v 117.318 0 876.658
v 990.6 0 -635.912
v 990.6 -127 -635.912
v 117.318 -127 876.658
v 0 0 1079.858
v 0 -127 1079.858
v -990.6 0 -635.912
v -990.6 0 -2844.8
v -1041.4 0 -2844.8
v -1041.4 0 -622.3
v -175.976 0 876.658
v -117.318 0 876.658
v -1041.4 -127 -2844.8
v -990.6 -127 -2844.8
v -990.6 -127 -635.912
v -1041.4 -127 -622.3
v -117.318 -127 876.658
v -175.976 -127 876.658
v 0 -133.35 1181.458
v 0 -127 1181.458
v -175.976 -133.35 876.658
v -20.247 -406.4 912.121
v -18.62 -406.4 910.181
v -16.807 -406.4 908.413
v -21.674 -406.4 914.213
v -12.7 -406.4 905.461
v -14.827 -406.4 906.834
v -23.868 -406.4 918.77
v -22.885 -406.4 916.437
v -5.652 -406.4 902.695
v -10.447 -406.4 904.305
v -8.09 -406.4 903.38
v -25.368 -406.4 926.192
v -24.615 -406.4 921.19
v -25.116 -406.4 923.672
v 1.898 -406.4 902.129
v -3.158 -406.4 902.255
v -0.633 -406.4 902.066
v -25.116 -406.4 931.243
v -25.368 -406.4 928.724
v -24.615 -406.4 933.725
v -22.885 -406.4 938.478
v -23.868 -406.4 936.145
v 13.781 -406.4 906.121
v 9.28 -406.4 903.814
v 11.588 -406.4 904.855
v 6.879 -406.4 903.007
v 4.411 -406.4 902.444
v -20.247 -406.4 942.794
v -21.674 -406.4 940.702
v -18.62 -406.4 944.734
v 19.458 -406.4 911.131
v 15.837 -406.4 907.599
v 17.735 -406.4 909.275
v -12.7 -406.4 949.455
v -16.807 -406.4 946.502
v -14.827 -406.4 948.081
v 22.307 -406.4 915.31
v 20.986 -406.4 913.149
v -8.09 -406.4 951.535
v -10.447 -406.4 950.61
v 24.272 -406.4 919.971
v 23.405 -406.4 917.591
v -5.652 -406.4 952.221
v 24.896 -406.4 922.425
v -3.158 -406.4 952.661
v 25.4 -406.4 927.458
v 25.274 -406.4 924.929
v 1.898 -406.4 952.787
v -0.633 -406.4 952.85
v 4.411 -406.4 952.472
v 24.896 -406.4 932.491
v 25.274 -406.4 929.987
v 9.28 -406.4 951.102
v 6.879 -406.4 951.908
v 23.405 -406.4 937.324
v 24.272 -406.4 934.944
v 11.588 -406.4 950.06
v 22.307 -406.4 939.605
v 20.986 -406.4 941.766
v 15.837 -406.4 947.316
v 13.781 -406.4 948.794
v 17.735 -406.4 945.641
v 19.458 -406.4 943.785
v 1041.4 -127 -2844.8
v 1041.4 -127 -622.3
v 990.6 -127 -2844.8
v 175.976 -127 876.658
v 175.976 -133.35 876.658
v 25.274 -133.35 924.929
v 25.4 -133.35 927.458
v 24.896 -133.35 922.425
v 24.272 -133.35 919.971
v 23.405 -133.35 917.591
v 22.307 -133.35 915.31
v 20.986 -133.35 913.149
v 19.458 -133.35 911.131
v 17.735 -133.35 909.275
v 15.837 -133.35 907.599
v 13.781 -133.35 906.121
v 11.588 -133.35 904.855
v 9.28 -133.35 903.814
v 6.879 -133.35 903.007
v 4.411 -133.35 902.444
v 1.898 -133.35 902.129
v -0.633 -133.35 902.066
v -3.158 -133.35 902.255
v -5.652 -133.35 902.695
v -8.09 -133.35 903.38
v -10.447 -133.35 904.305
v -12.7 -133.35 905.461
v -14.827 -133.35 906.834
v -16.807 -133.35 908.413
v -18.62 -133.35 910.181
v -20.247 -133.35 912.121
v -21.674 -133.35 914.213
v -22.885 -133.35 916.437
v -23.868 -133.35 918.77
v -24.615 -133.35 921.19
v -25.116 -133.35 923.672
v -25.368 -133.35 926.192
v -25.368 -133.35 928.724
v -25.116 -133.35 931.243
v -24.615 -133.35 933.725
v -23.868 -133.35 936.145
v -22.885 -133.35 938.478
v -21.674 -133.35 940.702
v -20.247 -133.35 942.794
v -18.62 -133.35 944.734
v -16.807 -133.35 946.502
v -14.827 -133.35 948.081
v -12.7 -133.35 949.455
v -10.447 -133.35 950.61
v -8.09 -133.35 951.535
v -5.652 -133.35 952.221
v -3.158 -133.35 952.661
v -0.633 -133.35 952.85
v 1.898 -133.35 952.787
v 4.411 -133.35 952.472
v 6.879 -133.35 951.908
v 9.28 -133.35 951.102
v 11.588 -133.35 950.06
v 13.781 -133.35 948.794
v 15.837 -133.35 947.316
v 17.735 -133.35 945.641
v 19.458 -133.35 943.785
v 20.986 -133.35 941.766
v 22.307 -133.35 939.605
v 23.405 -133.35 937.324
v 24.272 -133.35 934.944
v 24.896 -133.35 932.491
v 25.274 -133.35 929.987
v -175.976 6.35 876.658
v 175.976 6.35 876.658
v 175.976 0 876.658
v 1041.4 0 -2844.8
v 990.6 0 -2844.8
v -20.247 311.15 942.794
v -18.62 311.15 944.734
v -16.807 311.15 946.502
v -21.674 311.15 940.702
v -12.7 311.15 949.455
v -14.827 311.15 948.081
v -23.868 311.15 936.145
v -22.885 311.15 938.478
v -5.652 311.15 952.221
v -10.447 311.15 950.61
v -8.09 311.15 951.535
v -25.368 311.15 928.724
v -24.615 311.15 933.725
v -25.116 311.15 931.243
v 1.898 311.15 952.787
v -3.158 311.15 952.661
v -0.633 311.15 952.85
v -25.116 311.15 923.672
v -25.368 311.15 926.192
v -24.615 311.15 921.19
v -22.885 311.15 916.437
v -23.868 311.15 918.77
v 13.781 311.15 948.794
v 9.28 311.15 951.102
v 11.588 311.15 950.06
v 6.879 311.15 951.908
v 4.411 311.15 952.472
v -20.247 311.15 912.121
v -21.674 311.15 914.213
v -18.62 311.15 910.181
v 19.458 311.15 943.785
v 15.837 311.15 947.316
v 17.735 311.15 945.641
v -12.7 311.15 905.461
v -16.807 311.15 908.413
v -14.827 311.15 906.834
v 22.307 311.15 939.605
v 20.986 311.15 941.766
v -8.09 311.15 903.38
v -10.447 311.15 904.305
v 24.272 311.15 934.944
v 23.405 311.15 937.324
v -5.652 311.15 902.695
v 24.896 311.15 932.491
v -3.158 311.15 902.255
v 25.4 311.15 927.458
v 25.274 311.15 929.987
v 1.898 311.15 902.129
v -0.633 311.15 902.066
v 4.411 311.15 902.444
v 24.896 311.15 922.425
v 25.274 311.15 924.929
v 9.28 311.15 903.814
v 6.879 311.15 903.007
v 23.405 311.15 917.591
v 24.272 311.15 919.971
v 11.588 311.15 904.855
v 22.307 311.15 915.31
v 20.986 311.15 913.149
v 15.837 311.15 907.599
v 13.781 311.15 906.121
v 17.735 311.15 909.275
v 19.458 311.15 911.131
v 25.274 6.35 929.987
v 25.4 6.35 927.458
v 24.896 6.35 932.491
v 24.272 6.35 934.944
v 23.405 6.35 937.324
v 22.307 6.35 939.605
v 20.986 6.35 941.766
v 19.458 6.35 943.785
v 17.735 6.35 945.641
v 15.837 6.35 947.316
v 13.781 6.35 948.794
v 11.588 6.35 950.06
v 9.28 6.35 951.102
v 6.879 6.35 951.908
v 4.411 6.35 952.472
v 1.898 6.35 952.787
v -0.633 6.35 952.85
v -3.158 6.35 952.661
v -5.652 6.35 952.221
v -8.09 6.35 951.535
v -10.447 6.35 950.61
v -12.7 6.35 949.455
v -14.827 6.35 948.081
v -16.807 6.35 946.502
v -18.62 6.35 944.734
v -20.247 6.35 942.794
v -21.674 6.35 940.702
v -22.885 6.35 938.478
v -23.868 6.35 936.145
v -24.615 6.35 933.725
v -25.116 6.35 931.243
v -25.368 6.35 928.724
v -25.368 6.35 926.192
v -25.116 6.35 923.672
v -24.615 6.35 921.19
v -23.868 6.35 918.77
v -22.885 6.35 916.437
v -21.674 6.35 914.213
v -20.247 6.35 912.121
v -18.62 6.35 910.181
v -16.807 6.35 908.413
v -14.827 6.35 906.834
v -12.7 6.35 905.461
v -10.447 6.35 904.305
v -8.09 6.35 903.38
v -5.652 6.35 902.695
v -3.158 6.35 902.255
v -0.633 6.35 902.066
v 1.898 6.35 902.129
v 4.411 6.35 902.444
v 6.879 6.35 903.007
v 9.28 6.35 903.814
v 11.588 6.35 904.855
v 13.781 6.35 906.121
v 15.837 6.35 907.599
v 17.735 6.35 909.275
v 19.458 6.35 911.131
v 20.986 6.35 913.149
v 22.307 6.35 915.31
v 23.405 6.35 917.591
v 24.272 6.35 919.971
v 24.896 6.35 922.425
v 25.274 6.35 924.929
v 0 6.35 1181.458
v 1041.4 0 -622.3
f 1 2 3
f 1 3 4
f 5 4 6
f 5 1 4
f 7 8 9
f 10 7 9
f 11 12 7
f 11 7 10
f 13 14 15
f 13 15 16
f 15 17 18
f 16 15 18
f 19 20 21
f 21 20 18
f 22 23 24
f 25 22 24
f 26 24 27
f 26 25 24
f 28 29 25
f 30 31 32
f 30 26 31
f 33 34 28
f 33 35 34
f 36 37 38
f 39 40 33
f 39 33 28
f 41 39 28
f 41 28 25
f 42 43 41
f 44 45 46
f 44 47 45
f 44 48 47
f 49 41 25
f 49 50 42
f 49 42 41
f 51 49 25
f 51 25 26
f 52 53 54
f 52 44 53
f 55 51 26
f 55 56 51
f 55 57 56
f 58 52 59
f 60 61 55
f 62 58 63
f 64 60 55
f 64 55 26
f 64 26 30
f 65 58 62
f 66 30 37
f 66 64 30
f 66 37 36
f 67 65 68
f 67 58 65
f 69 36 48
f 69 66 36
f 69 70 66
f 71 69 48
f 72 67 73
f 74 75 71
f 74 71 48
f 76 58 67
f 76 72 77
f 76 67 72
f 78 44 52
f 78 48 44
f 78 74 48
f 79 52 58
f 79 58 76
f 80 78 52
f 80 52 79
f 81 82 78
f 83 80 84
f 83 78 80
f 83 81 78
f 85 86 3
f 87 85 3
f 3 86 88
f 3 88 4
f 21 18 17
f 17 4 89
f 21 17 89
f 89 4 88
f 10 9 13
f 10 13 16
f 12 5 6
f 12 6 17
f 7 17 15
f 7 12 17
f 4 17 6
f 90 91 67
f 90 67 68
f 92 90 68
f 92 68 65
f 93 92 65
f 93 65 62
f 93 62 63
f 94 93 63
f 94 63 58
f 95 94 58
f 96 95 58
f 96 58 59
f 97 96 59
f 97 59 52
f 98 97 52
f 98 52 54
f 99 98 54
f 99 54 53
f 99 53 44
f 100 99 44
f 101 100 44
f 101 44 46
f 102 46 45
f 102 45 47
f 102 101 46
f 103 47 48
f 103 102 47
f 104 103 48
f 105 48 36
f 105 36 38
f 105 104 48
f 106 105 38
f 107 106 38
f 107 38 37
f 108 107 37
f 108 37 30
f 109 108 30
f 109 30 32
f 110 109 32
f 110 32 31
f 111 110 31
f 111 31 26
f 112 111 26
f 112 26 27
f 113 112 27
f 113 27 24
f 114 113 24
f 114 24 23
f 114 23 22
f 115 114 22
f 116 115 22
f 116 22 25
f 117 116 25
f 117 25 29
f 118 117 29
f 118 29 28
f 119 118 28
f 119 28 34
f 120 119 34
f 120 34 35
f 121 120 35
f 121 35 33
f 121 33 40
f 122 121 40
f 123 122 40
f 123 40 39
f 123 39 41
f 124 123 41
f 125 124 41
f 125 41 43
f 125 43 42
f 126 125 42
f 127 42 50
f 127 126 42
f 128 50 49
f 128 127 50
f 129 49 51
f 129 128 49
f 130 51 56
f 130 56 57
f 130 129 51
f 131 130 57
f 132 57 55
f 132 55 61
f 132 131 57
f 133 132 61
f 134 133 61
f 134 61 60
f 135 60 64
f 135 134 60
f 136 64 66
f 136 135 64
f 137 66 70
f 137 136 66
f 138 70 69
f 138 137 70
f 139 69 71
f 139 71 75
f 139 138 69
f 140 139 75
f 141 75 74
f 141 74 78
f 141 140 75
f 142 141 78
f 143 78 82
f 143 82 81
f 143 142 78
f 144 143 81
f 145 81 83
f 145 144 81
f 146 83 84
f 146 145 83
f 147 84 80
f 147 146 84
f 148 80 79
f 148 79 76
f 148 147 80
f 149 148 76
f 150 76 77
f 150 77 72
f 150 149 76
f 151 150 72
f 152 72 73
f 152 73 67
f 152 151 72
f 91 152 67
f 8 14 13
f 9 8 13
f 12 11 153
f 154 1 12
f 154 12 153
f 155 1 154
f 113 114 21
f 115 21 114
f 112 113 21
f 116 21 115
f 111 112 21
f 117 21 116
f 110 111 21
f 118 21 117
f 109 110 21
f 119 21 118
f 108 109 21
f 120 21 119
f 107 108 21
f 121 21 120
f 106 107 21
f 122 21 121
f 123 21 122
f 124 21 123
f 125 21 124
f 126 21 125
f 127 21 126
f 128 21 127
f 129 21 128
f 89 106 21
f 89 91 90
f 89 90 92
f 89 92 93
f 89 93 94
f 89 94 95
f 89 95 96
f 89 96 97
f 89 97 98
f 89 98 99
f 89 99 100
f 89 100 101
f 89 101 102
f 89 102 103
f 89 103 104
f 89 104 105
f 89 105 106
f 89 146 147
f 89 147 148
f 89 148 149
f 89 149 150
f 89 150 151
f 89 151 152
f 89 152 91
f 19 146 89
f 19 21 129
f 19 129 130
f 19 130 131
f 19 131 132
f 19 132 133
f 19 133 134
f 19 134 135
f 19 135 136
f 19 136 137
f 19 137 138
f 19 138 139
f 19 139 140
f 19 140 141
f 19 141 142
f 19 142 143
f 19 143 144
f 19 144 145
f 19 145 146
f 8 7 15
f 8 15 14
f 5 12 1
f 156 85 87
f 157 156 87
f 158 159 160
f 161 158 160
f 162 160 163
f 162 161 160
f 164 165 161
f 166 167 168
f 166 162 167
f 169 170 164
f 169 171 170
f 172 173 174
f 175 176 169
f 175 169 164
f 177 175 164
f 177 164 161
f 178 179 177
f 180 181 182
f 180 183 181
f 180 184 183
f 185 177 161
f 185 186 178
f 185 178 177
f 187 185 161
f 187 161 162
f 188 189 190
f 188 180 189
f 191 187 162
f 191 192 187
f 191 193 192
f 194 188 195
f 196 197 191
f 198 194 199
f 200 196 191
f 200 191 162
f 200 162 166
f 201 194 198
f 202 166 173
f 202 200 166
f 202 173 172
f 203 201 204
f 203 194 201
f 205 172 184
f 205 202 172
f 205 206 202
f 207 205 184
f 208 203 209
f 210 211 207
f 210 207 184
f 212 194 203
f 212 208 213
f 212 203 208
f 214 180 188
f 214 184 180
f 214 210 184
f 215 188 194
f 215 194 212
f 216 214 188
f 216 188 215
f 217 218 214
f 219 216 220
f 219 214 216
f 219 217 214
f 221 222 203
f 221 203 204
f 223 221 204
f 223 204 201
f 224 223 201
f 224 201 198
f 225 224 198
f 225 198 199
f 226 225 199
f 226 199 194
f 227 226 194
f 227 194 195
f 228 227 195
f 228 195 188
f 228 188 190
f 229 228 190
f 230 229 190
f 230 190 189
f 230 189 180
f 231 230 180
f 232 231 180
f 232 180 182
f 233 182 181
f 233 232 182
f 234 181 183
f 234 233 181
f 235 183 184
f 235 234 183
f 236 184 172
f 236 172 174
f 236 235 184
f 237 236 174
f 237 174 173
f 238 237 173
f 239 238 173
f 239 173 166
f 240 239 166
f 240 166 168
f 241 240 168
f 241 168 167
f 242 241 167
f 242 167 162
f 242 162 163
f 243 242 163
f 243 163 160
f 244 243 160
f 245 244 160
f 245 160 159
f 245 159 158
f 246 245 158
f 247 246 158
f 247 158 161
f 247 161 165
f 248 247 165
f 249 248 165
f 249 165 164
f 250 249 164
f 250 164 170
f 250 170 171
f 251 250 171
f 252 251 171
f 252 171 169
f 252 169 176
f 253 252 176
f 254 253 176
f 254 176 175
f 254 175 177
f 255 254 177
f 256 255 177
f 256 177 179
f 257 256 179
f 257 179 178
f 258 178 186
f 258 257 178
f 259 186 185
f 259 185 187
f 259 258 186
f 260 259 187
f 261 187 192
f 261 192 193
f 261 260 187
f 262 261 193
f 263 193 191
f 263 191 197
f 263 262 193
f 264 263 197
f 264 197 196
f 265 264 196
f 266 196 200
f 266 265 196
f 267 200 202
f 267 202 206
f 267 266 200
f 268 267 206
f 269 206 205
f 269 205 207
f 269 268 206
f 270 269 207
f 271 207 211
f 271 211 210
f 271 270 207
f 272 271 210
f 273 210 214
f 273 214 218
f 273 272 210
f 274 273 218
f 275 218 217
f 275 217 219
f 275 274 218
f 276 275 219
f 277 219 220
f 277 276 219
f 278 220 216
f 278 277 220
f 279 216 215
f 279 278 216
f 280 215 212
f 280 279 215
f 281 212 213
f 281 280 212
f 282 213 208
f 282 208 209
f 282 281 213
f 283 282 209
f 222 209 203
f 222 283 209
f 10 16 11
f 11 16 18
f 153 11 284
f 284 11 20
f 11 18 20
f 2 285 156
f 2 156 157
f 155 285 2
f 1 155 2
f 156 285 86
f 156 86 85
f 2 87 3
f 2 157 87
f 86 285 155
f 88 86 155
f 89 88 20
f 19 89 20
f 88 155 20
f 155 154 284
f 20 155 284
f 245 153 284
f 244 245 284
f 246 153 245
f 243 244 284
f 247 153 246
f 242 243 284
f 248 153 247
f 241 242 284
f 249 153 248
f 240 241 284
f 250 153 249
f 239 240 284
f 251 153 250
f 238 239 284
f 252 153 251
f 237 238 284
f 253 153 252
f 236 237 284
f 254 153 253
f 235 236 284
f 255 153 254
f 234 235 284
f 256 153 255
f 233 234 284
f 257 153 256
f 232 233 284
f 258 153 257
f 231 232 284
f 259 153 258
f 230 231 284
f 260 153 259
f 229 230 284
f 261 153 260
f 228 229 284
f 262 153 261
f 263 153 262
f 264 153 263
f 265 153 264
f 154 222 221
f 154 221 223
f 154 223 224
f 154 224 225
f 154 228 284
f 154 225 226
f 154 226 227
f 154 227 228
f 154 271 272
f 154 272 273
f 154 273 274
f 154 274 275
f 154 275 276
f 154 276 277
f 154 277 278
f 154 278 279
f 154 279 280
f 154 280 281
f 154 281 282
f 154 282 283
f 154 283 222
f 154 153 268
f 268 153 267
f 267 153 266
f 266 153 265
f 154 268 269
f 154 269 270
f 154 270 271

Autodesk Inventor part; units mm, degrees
ref_plane "YZ Plane" through (0, 0, 0) normal (1, 0, 0) x (0, 1, 0)
ref_plane "XZ Plane" through (0, 0, 0) normal (0, 1, 0) x (-1, 0, 0)
ref_plane "XY Plane" through (0, 0, 0) normal (0, 0, 1) x (1, 0, 0)
sketch "Sketch1" plane through (0, 0, 0) normal (0, 1, 0) x (-1, 0, 0)
  line L0 (0, 0) -> (0, 1079.8577)
  line L1 (0, 1079.8577) -> (990.6, -635.9118)
  line L2 (990.6, -635.9118) -> (990.6, -2844.8)
  line L3 (990.6, -2844.8) -> (1041.4, -2844.8)
  line L4 (1041.4, -2844.8) -> (1041.4, -622.3)
  line L5 (1041.4, -622.3) -> (0, 1181.4577)
  line L6 (0, 1181.4577) -> (-1041.4, -622.3)
  line L7 (-1041.4, -622.3) -> (-1041.4, -2844.8)
  line L8 (-1041.4, -2844.8) -> (-990.6, -2844.8)
  line L9 (-990.6, -2844.8) -> (-990.6, -635.9118)
  line L10 (-990.6, -635.9118) -> (0, 1079.8577)
  line L11 (0, 1079.8577) -> (0, 1181.4577)
  dimension "d0" = 2082.8
  dimension "d1" = 50.8
  dimension "d3" = 150
  dimension "d4" = 622.3
  dimension "d5" = 50.8
  dimension "d21" = 2222.5
extrude "Extrusion1" add sketch "Sketch1" against normal blind 127
sketch "Sketch2" plane through (0, 0, 0) normal (0, 1, 0) x (1, 0, 0)
  line L0 (-1041.4, 622.3) -> (0, -1181.4577) projected
  line L1 (-175.9764, -876.6577) -> (175.9764, -876.6577)
  line L2 (1041.4, 622.3) -> (0, -1181.4577) projected
  line L3 (175.9764, -876.6577) -> (0, -1181.4577)
  line L4 (0, -1181.4577) -> (-175.9764, -876.6577)
  line L5 (0, -1079.8577) -> (-990.6, 635.9118) projected
  point P0 (0, 0)
  dimension "d8" = 304.8
extrude "Extrusion2" add sketch "Sketch2" along normal blind 6.35
sketch "Sketch3" plane through (0, -127, 0) normal (0, -1, 0) x (1, 0, 0)
  line L0 (-1041.4, -622.3) -> (-175.9764, 876.6577) projected
  line L1 (117.3176, 876.6577) -> (175.9764, 876.6577) projected
  line L2 (-175.9764, 876.6577) -> (175.9764, 876.6577)
  line L3 (1041.4, -622.3) -> (0, 1181.4577) projected
  line L4 (175.9764, 876.6577) -> (0, 1181.4577)
  line L5 (0, 1181.4577) -> (-175.9764, 876.6577)
  point P0 (0, 0)
extrude "Extrusion3" add sketch "Sketch3" along normal blind 6.35
sketch "Sketch4" plane through (0, 6.35, 0) normal (0, 1, 0) x (1, 0, 0)
  circle A0 centre (0, -927.4577) radius 25.4
  line L0 (0, -927.4577) -> (0, -876.6577)
  line L1 (117.3176, -876.6577) -> (-117.3176, -876.6577) projected
  point P0 (0, 0)
  dimension "d13" = 50.8
  dimension "d14" = 50.8
extrude "Extrusion4" add sketch "Sketch4" along normal blind 304.8
sketch "Sketch5" plane through (0, -133.35, 0) normal (0, -1, 0) x (1, 0, 0)
  line L0 (175.9764, 876.6577) -> (-175.9764, 876.6577) projected
  line L1 (0, 876.6577) -> (0, 927.4577)
  circle A0 centre (0, 927.4577) radius 25.4
  point P0 (0, 0)
  dimension "d17" = 50.8
  dimension "d18" = 50.8
extrude "Extrusion5" add sketch "Sketch5" along normal blind 273.05
properties part number "Hauling_Wishbone"
